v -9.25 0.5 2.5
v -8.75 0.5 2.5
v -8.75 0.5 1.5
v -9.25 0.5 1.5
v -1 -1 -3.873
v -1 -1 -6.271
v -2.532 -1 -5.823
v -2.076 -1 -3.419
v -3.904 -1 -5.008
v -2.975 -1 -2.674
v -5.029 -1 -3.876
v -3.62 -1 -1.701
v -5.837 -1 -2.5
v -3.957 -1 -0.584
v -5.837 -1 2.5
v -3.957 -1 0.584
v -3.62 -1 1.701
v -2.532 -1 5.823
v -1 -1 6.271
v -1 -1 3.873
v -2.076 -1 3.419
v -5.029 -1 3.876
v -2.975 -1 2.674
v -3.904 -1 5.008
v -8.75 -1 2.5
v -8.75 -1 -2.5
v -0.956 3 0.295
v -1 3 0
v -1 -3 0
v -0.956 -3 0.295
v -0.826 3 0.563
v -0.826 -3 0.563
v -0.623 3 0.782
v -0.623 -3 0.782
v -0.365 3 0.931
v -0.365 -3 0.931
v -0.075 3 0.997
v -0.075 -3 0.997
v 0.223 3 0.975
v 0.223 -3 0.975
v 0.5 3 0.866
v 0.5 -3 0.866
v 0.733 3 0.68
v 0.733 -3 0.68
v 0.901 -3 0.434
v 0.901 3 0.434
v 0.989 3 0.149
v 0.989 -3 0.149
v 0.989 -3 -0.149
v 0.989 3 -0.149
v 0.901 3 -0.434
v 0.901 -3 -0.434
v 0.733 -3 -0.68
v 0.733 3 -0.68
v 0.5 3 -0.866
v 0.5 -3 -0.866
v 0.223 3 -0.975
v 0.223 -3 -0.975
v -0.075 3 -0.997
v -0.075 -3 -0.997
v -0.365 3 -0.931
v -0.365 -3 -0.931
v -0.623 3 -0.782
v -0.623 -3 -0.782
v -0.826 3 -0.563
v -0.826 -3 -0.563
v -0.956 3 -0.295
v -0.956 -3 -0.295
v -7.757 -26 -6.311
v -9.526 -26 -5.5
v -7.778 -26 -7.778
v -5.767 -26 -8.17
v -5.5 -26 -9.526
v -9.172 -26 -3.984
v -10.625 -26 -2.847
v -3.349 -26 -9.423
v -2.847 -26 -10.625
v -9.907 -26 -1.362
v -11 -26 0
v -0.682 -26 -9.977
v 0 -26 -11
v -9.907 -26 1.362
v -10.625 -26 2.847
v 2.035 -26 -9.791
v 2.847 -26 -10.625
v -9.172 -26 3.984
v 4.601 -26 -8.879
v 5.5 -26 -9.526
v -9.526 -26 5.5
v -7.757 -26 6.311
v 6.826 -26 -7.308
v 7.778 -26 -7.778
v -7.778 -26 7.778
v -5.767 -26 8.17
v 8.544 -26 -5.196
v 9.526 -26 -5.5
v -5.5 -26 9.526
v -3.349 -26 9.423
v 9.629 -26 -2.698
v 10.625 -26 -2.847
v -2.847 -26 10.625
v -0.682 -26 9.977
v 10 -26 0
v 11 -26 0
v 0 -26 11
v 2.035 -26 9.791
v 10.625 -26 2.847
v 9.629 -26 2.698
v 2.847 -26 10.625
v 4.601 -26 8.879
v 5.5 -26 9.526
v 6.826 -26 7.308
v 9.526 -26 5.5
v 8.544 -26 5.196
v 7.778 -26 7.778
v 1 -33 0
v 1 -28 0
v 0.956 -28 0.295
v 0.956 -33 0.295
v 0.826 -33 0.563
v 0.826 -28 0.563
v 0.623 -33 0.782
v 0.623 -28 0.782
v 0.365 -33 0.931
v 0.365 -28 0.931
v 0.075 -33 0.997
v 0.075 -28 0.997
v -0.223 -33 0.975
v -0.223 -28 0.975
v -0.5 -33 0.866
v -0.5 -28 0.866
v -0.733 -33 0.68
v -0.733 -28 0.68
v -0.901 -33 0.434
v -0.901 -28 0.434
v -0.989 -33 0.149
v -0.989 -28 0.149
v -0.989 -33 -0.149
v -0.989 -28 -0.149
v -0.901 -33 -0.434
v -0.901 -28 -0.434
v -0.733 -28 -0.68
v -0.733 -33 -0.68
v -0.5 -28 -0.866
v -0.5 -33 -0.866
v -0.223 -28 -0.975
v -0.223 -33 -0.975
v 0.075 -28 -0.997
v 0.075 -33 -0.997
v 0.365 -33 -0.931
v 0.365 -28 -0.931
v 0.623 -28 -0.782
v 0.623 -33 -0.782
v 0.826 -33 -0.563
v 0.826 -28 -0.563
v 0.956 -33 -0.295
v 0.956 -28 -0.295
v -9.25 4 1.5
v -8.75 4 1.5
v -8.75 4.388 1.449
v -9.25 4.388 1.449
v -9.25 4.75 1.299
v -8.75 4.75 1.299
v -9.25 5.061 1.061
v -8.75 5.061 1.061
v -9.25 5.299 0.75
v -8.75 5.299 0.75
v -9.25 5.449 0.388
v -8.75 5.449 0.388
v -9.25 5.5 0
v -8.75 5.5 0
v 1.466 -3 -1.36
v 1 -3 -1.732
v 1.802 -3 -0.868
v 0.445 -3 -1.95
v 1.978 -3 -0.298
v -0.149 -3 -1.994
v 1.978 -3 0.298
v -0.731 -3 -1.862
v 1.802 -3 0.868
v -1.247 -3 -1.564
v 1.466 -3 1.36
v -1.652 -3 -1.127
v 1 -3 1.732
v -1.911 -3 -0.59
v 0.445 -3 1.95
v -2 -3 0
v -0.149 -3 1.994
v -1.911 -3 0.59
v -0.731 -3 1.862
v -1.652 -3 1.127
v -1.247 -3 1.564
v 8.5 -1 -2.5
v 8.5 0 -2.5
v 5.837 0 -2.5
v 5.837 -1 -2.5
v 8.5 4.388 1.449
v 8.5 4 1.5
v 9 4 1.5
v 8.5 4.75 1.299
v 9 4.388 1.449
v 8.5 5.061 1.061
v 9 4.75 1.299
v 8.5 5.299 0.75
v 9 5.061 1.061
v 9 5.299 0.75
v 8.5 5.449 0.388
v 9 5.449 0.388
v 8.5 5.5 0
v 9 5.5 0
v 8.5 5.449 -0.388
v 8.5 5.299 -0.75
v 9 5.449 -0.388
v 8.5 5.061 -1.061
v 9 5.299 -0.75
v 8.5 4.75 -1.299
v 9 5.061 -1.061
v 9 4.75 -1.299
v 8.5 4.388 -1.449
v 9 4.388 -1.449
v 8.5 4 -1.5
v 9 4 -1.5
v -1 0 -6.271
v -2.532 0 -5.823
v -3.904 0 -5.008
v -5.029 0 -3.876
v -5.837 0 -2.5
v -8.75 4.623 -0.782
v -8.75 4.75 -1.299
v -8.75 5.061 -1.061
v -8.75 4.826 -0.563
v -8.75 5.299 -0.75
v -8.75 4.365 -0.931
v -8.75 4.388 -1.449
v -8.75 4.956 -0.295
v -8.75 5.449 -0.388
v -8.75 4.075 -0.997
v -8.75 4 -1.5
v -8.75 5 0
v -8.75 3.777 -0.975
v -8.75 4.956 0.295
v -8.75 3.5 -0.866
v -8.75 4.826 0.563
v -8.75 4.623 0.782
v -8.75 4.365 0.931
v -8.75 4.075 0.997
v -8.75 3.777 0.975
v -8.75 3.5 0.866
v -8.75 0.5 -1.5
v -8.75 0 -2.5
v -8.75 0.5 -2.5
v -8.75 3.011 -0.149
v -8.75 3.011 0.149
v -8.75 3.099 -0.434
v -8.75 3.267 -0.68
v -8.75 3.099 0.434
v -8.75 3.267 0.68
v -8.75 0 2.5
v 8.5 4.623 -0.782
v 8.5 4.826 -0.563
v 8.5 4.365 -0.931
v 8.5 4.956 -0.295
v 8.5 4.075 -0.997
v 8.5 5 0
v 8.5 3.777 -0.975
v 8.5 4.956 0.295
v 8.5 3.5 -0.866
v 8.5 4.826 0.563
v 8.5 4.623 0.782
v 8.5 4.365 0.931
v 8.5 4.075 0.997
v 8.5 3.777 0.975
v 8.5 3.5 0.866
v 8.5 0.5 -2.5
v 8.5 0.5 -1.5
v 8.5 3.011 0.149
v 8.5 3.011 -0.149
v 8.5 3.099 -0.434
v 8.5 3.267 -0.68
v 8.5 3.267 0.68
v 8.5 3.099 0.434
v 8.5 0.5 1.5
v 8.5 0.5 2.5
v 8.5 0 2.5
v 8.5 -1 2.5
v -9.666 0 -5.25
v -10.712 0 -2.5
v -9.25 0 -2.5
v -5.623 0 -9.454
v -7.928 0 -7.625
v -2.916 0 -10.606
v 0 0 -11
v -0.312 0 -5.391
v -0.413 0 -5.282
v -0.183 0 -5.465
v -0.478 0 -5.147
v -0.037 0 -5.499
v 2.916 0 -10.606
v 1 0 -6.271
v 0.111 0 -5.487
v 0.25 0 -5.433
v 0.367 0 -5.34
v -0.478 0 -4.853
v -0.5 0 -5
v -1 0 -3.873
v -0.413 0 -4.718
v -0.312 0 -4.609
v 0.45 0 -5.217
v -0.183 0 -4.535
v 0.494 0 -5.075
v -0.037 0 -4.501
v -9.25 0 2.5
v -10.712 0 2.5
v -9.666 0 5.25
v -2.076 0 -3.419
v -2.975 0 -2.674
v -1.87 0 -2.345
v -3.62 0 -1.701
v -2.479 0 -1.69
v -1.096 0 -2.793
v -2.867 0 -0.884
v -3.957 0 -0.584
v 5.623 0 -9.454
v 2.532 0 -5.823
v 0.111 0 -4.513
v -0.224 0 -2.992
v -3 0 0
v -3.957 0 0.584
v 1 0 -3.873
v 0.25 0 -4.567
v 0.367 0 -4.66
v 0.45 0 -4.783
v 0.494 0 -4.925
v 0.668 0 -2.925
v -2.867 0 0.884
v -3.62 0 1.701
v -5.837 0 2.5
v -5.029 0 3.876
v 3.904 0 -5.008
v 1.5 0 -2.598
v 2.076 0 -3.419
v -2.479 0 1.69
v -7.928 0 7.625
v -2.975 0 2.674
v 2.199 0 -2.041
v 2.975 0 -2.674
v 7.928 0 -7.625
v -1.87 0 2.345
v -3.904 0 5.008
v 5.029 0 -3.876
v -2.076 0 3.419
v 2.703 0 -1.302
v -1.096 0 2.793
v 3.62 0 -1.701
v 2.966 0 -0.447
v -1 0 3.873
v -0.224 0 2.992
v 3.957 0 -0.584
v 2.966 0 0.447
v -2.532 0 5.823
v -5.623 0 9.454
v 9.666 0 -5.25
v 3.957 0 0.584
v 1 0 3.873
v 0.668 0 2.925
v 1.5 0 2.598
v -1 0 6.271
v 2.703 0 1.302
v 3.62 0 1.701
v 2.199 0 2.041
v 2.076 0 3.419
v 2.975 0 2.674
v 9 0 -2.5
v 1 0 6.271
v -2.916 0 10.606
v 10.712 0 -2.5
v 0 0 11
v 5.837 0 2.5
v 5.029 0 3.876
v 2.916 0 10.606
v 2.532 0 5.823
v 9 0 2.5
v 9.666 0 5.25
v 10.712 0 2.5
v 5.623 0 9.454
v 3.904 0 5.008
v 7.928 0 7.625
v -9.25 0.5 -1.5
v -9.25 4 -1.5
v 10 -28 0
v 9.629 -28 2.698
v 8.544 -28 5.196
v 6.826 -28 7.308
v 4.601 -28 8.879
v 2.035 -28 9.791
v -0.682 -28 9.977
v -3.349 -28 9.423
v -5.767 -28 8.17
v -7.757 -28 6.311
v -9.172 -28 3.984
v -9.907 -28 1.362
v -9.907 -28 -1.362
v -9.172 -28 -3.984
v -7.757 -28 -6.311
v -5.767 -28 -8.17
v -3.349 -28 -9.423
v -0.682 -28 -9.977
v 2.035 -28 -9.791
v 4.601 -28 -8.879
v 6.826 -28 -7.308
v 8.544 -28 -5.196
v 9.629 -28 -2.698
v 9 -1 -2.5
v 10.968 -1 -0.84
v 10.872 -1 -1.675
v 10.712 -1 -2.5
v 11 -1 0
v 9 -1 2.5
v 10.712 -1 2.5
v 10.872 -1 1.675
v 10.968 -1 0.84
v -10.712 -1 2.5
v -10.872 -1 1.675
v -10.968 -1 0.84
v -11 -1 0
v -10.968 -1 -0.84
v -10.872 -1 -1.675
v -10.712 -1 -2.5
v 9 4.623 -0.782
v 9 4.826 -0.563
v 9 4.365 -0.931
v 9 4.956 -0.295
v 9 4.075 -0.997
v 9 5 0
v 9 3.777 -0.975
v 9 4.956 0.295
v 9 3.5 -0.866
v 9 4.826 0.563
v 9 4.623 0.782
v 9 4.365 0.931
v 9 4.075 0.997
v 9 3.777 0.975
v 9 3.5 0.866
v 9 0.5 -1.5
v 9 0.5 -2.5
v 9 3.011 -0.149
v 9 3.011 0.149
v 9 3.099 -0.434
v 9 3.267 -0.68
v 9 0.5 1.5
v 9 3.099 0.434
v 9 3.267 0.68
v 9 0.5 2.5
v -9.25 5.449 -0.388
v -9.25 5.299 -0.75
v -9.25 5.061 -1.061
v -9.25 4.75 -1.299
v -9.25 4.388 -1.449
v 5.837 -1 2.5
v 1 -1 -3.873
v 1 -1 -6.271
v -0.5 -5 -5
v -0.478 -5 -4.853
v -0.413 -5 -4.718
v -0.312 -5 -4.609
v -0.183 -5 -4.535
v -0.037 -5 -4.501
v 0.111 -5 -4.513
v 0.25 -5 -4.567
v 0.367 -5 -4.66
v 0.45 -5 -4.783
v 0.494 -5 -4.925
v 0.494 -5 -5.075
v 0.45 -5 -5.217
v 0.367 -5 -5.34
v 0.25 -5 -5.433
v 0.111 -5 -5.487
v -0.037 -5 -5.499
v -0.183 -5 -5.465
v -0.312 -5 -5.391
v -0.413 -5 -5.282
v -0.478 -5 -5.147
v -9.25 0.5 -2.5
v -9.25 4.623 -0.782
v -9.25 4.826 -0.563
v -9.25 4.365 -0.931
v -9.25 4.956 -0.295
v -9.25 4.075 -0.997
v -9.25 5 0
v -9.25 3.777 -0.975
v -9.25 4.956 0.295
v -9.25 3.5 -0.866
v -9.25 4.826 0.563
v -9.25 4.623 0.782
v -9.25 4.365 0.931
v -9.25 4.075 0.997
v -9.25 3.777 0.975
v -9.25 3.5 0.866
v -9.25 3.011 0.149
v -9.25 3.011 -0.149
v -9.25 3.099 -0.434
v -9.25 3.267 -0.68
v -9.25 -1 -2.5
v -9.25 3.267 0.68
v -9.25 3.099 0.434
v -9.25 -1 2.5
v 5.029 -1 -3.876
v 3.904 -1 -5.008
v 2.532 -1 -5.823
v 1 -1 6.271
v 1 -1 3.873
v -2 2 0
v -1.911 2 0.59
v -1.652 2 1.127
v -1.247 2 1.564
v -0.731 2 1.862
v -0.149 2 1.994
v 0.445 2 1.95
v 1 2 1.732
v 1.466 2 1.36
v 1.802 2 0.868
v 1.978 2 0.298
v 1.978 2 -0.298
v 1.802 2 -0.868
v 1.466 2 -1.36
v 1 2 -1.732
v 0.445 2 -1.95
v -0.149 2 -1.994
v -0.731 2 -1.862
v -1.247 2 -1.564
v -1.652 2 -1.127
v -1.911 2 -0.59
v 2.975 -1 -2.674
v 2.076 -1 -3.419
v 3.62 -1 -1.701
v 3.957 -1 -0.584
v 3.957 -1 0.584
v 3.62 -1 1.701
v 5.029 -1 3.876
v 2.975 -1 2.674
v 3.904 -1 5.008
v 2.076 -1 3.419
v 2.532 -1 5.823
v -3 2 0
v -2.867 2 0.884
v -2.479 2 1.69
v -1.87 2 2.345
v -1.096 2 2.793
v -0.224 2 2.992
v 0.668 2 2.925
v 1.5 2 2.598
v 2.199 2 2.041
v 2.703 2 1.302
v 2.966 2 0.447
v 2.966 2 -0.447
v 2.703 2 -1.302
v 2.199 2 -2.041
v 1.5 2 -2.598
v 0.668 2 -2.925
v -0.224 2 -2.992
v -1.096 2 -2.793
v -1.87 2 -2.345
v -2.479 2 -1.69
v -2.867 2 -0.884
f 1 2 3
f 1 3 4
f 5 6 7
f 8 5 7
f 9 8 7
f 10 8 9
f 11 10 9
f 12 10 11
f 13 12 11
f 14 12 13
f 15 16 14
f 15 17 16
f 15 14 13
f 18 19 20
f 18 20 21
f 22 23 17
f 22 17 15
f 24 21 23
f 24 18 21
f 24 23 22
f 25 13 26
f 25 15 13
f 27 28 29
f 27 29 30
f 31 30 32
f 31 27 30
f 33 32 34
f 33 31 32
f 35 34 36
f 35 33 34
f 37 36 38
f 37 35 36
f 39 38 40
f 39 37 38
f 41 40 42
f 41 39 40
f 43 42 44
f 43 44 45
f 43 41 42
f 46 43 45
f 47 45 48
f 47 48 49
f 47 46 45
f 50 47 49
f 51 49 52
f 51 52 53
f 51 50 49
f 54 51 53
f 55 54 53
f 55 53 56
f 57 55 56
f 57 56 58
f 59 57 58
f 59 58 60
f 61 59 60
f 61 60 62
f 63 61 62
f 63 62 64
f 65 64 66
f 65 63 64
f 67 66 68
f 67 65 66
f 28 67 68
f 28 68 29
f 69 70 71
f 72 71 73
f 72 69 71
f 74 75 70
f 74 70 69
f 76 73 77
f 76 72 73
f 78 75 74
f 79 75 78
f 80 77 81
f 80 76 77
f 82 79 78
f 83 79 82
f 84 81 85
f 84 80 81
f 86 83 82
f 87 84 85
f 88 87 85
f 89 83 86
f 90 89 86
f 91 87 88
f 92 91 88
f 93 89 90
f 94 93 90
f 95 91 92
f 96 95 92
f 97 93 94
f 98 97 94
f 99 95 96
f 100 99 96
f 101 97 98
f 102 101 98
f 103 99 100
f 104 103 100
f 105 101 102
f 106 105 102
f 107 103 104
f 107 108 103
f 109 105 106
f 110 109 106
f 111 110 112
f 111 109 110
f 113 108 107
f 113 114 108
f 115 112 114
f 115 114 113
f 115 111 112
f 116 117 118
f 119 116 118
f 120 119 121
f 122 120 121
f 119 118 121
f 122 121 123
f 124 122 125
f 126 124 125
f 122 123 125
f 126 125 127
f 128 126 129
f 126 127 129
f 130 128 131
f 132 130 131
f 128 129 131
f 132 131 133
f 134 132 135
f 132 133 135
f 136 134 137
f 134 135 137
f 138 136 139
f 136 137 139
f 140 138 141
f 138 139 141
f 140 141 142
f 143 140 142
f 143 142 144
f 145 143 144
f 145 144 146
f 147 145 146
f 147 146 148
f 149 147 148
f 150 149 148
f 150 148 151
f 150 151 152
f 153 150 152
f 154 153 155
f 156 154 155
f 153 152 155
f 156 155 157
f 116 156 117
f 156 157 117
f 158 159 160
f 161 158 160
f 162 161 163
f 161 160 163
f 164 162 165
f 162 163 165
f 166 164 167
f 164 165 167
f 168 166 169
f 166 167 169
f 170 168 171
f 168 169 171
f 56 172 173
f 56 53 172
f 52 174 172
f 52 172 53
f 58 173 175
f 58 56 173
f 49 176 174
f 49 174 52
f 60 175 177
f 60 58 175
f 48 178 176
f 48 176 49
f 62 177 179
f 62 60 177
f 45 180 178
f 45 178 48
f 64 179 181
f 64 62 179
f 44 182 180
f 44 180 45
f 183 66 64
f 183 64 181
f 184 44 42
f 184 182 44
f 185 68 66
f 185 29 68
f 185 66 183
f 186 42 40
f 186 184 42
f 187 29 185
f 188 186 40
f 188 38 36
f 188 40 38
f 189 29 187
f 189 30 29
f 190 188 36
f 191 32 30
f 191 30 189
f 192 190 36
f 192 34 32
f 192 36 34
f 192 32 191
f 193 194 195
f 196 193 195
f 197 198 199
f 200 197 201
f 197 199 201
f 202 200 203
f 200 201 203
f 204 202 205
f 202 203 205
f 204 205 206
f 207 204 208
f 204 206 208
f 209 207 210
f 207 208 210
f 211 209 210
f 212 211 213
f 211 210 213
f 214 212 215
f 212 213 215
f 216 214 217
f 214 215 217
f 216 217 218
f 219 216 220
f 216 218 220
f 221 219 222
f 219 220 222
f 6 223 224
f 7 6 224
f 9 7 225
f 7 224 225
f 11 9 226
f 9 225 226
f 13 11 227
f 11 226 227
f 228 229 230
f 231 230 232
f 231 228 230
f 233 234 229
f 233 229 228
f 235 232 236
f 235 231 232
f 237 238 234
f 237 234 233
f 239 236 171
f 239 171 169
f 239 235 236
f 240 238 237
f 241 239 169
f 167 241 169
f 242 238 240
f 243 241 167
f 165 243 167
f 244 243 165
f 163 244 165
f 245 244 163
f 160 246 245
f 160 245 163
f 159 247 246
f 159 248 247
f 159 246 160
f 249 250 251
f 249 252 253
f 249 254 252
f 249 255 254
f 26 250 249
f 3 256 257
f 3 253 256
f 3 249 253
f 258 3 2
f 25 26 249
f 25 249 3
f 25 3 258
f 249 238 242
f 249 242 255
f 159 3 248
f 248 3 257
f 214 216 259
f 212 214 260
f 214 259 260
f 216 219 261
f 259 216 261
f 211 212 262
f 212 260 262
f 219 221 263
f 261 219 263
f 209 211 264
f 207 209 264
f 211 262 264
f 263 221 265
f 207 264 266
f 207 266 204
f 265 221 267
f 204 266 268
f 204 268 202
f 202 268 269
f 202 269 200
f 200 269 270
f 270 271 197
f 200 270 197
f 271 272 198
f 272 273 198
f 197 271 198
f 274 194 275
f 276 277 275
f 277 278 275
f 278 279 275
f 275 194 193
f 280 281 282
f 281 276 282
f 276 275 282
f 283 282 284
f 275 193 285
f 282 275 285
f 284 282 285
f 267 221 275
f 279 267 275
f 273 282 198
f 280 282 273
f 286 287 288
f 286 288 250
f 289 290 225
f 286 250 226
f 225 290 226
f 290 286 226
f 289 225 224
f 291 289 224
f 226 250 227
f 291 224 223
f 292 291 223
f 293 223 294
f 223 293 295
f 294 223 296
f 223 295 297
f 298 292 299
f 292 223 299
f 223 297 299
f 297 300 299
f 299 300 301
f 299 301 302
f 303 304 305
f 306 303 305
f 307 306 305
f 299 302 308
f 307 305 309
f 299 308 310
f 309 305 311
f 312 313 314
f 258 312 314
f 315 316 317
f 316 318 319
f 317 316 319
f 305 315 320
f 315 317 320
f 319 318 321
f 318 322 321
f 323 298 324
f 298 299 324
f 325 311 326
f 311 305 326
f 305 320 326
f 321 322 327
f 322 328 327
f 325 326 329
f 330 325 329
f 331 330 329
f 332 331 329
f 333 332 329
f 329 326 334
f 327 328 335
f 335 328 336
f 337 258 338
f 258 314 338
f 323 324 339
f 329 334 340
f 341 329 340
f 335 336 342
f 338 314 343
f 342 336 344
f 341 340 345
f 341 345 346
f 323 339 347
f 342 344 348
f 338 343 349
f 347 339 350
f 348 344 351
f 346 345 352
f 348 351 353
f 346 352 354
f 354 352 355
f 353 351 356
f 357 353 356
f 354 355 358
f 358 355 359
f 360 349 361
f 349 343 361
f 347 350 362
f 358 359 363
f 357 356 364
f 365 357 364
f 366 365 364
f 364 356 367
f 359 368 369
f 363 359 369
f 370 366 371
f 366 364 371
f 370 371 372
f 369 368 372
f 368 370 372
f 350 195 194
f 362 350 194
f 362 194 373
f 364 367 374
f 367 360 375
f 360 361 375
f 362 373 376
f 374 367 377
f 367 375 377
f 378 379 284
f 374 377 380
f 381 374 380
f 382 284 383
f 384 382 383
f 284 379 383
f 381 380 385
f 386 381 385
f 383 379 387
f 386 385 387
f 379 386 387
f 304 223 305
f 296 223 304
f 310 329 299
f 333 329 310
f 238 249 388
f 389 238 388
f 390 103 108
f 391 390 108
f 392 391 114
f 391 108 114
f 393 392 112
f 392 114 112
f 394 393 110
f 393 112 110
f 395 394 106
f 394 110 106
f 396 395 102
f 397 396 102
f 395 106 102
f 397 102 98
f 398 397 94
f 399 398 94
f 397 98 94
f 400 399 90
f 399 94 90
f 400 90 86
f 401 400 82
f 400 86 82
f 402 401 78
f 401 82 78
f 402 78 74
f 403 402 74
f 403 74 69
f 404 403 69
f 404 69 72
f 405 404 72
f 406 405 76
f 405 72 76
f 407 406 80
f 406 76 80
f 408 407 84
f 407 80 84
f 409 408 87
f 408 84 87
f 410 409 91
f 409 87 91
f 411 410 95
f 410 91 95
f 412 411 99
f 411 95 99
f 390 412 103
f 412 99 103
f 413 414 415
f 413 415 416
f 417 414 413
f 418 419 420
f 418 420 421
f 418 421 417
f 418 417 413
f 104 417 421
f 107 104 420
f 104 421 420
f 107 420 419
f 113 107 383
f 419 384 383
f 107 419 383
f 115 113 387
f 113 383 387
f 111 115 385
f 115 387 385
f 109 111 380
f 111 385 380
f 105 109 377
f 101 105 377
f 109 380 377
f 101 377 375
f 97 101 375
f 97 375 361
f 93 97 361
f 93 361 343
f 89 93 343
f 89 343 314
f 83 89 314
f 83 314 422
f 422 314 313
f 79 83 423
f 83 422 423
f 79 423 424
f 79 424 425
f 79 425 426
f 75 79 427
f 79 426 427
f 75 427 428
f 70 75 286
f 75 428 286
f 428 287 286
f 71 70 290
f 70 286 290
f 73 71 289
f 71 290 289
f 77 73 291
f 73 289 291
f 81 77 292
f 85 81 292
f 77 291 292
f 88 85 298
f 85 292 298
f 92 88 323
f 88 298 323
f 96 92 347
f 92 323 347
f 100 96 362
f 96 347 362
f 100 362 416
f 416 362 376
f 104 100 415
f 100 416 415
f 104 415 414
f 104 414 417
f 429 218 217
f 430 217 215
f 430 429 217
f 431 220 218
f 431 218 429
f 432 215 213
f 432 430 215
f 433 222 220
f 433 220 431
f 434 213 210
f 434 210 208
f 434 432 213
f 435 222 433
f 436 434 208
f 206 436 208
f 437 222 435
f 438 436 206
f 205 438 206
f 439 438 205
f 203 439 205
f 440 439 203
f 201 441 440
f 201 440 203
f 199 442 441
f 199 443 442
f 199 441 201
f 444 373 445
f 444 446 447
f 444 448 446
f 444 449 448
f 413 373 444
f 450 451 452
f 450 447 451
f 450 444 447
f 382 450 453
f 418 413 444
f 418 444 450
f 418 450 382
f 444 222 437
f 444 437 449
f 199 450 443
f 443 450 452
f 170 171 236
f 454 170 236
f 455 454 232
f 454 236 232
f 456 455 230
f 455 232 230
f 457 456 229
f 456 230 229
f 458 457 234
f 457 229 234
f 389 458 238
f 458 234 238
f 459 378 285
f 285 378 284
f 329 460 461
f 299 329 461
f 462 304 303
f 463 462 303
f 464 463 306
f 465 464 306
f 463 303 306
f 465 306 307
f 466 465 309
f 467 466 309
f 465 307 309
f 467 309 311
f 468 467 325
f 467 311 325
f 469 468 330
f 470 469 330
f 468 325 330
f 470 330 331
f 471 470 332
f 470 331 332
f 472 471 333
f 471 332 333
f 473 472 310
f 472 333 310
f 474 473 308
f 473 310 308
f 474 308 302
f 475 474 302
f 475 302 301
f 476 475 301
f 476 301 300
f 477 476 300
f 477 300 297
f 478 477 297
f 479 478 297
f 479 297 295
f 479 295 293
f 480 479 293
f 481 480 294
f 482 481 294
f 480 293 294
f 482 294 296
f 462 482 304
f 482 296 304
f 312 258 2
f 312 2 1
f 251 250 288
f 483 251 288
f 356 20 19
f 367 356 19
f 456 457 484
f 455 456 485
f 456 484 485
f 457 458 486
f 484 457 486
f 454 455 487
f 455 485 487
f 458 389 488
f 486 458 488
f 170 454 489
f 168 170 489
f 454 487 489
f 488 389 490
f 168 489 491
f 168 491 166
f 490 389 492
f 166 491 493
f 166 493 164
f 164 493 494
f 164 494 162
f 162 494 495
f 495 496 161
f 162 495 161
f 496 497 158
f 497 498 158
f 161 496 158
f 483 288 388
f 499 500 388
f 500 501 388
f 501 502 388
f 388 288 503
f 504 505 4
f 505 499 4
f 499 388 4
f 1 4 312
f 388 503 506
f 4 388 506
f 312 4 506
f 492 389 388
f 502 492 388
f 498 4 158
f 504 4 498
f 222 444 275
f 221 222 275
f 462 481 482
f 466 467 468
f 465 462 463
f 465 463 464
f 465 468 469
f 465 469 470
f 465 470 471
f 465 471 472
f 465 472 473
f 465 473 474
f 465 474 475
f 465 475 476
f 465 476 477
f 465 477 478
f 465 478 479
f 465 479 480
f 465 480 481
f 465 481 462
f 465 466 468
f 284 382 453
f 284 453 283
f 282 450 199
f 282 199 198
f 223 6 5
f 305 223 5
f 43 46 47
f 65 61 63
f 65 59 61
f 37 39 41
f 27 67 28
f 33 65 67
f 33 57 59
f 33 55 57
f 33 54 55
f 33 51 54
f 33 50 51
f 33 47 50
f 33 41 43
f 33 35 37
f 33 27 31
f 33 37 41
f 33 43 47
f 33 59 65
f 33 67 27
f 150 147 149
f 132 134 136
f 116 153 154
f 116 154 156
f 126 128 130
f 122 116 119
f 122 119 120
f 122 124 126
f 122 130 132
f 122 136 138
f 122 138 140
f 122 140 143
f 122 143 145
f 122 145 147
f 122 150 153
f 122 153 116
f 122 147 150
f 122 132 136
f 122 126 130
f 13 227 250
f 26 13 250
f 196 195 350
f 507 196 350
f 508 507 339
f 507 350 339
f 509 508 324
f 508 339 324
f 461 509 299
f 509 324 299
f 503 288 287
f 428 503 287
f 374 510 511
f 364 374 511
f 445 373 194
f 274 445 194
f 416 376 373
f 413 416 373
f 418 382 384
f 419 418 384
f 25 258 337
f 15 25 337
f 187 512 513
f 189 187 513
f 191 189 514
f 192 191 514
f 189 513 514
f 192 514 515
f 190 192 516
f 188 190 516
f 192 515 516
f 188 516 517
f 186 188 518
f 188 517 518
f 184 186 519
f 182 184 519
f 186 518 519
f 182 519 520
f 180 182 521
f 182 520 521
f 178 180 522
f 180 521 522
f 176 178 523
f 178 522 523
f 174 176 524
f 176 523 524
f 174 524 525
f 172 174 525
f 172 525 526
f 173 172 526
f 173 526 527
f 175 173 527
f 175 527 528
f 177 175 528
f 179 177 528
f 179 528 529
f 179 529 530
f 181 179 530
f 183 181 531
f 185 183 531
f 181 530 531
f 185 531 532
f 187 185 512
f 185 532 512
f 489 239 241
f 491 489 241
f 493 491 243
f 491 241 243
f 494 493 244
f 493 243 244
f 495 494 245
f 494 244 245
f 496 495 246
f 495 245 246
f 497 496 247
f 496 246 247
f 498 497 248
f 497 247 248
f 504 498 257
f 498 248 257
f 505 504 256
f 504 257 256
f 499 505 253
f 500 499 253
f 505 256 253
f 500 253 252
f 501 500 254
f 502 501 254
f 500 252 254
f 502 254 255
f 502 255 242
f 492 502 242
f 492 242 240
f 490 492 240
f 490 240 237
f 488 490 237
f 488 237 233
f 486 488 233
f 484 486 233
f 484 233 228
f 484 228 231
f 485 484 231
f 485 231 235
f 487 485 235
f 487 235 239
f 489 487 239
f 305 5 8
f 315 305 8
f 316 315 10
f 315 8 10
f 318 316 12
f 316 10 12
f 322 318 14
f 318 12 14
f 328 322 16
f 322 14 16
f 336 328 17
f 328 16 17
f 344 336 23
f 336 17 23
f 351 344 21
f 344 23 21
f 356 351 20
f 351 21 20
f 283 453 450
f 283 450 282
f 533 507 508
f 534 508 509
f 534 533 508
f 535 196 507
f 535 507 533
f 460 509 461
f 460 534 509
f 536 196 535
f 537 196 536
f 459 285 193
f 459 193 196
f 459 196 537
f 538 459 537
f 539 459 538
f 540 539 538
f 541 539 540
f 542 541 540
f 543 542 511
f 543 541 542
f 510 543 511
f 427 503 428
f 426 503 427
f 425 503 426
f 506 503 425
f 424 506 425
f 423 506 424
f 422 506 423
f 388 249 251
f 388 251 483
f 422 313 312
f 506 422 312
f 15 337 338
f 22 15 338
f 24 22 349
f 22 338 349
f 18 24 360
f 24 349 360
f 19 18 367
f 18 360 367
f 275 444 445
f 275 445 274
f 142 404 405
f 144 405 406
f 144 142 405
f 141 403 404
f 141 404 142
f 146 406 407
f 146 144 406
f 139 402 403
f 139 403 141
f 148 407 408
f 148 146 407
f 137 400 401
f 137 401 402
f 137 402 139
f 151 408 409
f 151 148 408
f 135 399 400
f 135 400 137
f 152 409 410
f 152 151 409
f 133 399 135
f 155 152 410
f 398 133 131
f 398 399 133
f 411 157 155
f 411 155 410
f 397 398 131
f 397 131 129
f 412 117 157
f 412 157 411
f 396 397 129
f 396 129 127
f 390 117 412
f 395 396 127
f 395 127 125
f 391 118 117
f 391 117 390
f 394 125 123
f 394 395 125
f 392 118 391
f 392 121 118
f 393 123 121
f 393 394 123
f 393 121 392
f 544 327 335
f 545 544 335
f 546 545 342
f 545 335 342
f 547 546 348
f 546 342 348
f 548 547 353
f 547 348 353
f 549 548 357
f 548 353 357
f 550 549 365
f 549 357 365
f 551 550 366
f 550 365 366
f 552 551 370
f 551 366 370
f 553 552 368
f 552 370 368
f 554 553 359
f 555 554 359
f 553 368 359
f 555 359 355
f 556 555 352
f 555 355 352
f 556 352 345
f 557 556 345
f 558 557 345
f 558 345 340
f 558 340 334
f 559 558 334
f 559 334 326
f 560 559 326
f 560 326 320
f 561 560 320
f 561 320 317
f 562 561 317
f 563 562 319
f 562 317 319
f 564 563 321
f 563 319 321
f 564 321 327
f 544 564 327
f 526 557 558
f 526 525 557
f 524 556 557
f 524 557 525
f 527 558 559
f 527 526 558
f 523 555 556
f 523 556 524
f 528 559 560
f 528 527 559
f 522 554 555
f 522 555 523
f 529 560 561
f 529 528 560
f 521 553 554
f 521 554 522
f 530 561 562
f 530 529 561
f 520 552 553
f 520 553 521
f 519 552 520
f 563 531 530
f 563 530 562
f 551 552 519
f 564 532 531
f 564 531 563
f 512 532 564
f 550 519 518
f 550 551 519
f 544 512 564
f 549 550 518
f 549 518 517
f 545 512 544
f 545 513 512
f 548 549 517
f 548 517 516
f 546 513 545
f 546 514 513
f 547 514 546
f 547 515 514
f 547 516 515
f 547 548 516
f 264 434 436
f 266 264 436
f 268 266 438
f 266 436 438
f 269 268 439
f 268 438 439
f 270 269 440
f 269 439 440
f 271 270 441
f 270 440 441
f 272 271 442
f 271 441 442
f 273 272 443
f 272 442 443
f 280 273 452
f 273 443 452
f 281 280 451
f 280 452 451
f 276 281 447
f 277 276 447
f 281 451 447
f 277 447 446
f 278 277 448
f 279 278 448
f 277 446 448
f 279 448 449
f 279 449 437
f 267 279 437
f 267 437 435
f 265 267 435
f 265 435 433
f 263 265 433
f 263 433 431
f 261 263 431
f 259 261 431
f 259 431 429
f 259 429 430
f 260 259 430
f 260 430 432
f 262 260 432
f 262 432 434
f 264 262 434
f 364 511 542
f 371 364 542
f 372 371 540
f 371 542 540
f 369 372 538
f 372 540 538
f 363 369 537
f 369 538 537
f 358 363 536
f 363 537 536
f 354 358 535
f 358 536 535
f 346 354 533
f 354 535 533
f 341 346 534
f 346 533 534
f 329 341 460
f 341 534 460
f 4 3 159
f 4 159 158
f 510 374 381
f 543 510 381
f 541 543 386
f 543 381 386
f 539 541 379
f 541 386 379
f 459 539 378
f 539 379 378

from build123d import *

# Parameters (mm, degrees)
F0_R      = 11
F1_DEPTH  = 26
F2_R      = 10
F3_DEPTH  = 2
F4_R      = 1
F5_DEPTH  = 5
F7_DEPTH  = 1
F9_DEPTH  = 1
F10_R     = 3
F11_DEPTH = 2
F12_R     = 2
F12_R_2   = 1
F13_DEPTH = 5
F14_DEPTH = 1
F15_R     = 0.5
F16_DEPTH = 5
F17_W     = 0.5
F17_H     = 5
F18_DEPTH = 1.5
F19_W     = 0.5
F19_H     = 3
F20_DEPTH = 5
F21_W     = 0.5
F21_H     = 5
F22_DEPTH = 1.5
F23_W     = 0.5
F23_H     = 3
F24_DEPTH = 5
F26_DEPTH = 20.001
F27_DEPTH = 20.001
F25_R     = 1
F28_DEPTH = 20.001


with BuildPart() as f1:
    # F0 (on Front) → F1 (new body)
    with BuildSketch(Plane.XZ):
        Circle(F0_R)
    extrude(amount=F1_DEPTH)

    # F2 (on face) → F3 (join)
    with BuildSketch(Plane.XZ.offset(26)):
        Circle(F2_R)
    extrude(amount=F3_DEPTH)

    # F4 (on face) → F5 (join)
    with BuildSketch(Plane.XZ.offset(28)):
        Circle(F4_R)
    extrude(amount=F5_DEPTH)

    # F6 (on face) → F7 (cut)
    with BuildSketch(Plane(origin=(0, 0, 0), x_dir=(-1, 0, 0), z_dir=(0, 1, 0))):
        with BuildLine():
            Line((-10.7121426428, -2.5), (-5.837165408, -2.5))
            ThreePointArc((-5.837165408, -2.5), (0, -6.35), (5.837165408, -2.5))
            Line((5.837165408, -2.5), (10.7121426428, -2.5))
            ThreePointArc((10.7121426428, -2.5), (10.9277987049, -1.258258902), (11, 0))
            ThreePointArc((11, 0), (10.9277987049, 1.258258902), (10.7121426428, 2.5))
            Line((10.7121426428, 2.5), (5.837165408, 2.5))
            ThreePointArc((5.837165408, 2.5), (0, 6.35), (-5.837165408, 2.5))
            Line((-5.837165408, 2.5), (-10.7121426428, 2.5))
            ThreePointArc((-10.7121426428, 2.5), (-11, 0), (-10.7121426428, -2.5))
        make_face()
    extrude(amount=-F7_DEPTH, mode=Mode.SUBTRACT)

    # F8 (on face) → F9 (join)
    with BuildSketch(Plane(origin=(0, -1, 0), x_dir=(-1, 0, 0), z_dir=(0, 1, 0))):
        with BuildLine():
            Line((-1, 6.2707655035), (-1, 3.8729833462))
            ThreePointArc((-1, 3.8729833462), (-4, 0), (-1, -3.8729833462))
            Line((-1, -3.8729833462), (-1, -6.2707655035))
            ThreePointArc((-1, -6.2707655035), (0, -6.35), (1, -6.2707655035))
            Line((1, -6.2707655035), (1, -3.8729833462))
            ThreePointArc((1, -3.8729833462), (4, 0), (1, 3.8729833462))
            Line((1, 3.8729833462), (1, 6.2707655035))
            ThreePointArc((1, 6.2707655035), (0, 6.35), (-1, 6.2707655035))
        make_face()
    extrude(amount=F9_DEPTH)

    # F10 (on face) → F11 (join)
    with BuildSketch(Plane(origin=(0, 0, 0), x_dir=(-1, 0, 0), z_dir=(0, 1, 0))):
        Circle(F10_R)
    extrude(amount=F11_DEPTH)

    # F12 (on face) → F13 (cut)
    with BuildSketch(Plane(origin=(0, 2, 0), x_dir=(-1, 0, 0), z_dir=(0, 1, 0))):
        Circle(F12_R)
        Circle(F12_R_2, mode=Mode.SUBTRACT)
    extrude(amount=-F13_DEPTH, mode=Mode.SUBTRACT)

    # F14 (add): a face of the model
    f14_faces = [f1.faces().sort_by_distance(p)[0] for p in [
        (0, 2, 0),
    ]]
    extrude(f14_faces, amount=F14_DEPTH)

    # F15 (on face) → F16 (cut)
    with BuildSketch(Plane(origin=(0, 0, 0), x_dir=(-1, 0, 0), z_dir=(0, 1, 0))):
        with Locations((0, -5)):
            Circle(F15_R)
    extrude(amount=-F16_DEPTH, mode=Mode.SUBTRACT)

    # F17 (on face) → F18 (join)
    with BuildSketch(Plane(origin=(0, -1, 0), x_dir=(-1, 0, 0), z_dir=(0, 1, 0))):
        with Locations((-8.75, 0)):
            Rectangle(F17_W, F17_H)
    extrude(amount=F18_DEPTH)

    # F19 (on face) → F20 (join)
    with BuildSketch(Plane(origin=(0, 0.5, 0), x_dir=(-1, 0, 0), z_dir=(0, 1, 0))):
        with Locations((-8.75, 0)):
            Rectangle(F19_W, F19_H)
    extrude(amount=F20_DEPTH)

    # F21 (on face) → F22 (join)
    with BuildSketch(Plane(origin=(0, -1, 0), x_dir=(-1, 0, 0), z_dir=(0, 1, 0))):
        with Locations((9, 0)):
            Rectangle(F21_W, F21_H)
    extrude(amount=F22_DEPTH)

    # F23 (on face) → F24 (join)
    with BuildSketch(Plane(origin=(0, 0.5, 0), x_dir=(-1, 0, 0), z_dir=(0, 1, 0))):
        with Locations((9, 0)):
            Rectangle(F23_W, F23_H)
    extrude(amount=F24_DEPTH)

    # F25 (on face) → F26 (cut, through all)
    with BuildSketch(Plane.YZ.offset(9)):
        with BuildLine():
            ThreePointArc((4, 1.5), (5.0606601718, 1.0606601718), (5.5, 0))
            Line((5.5, 0), (5.5, 1.5))
            Line((5.5, 1.5), (4, 1.5))
        make_face()
    extrude(amount=-F26_DEPTH, mode=Mode.SUBTRACT)

    # F25 (on face) → F27 (cut, through all)
    with BuildSketch(Plane.YZ.offset(9)):
        with BuildLine():
            ThreePointArc((5.5, 0), (5.0606601718, -1.0606601718), (4, -1.5))
            Line((4, -1.5), (5.5, -1.5))
            Line((5.5, -1.5), (5.5, 0))
        make_face()
    extrude(amount=-F27_DEPTH, mode=Mode.SUBTRACT)

    # F25 (on face) → F28 (cut, through all)
    with BuildSketch(Plane.YZ.offset(9)):
        with Locations((4, 0)):
            Circle(F25_R)
    extrude(amount=-F28_DEPTH, mode=Mode.SUBTRACT)


solid = f1.part
